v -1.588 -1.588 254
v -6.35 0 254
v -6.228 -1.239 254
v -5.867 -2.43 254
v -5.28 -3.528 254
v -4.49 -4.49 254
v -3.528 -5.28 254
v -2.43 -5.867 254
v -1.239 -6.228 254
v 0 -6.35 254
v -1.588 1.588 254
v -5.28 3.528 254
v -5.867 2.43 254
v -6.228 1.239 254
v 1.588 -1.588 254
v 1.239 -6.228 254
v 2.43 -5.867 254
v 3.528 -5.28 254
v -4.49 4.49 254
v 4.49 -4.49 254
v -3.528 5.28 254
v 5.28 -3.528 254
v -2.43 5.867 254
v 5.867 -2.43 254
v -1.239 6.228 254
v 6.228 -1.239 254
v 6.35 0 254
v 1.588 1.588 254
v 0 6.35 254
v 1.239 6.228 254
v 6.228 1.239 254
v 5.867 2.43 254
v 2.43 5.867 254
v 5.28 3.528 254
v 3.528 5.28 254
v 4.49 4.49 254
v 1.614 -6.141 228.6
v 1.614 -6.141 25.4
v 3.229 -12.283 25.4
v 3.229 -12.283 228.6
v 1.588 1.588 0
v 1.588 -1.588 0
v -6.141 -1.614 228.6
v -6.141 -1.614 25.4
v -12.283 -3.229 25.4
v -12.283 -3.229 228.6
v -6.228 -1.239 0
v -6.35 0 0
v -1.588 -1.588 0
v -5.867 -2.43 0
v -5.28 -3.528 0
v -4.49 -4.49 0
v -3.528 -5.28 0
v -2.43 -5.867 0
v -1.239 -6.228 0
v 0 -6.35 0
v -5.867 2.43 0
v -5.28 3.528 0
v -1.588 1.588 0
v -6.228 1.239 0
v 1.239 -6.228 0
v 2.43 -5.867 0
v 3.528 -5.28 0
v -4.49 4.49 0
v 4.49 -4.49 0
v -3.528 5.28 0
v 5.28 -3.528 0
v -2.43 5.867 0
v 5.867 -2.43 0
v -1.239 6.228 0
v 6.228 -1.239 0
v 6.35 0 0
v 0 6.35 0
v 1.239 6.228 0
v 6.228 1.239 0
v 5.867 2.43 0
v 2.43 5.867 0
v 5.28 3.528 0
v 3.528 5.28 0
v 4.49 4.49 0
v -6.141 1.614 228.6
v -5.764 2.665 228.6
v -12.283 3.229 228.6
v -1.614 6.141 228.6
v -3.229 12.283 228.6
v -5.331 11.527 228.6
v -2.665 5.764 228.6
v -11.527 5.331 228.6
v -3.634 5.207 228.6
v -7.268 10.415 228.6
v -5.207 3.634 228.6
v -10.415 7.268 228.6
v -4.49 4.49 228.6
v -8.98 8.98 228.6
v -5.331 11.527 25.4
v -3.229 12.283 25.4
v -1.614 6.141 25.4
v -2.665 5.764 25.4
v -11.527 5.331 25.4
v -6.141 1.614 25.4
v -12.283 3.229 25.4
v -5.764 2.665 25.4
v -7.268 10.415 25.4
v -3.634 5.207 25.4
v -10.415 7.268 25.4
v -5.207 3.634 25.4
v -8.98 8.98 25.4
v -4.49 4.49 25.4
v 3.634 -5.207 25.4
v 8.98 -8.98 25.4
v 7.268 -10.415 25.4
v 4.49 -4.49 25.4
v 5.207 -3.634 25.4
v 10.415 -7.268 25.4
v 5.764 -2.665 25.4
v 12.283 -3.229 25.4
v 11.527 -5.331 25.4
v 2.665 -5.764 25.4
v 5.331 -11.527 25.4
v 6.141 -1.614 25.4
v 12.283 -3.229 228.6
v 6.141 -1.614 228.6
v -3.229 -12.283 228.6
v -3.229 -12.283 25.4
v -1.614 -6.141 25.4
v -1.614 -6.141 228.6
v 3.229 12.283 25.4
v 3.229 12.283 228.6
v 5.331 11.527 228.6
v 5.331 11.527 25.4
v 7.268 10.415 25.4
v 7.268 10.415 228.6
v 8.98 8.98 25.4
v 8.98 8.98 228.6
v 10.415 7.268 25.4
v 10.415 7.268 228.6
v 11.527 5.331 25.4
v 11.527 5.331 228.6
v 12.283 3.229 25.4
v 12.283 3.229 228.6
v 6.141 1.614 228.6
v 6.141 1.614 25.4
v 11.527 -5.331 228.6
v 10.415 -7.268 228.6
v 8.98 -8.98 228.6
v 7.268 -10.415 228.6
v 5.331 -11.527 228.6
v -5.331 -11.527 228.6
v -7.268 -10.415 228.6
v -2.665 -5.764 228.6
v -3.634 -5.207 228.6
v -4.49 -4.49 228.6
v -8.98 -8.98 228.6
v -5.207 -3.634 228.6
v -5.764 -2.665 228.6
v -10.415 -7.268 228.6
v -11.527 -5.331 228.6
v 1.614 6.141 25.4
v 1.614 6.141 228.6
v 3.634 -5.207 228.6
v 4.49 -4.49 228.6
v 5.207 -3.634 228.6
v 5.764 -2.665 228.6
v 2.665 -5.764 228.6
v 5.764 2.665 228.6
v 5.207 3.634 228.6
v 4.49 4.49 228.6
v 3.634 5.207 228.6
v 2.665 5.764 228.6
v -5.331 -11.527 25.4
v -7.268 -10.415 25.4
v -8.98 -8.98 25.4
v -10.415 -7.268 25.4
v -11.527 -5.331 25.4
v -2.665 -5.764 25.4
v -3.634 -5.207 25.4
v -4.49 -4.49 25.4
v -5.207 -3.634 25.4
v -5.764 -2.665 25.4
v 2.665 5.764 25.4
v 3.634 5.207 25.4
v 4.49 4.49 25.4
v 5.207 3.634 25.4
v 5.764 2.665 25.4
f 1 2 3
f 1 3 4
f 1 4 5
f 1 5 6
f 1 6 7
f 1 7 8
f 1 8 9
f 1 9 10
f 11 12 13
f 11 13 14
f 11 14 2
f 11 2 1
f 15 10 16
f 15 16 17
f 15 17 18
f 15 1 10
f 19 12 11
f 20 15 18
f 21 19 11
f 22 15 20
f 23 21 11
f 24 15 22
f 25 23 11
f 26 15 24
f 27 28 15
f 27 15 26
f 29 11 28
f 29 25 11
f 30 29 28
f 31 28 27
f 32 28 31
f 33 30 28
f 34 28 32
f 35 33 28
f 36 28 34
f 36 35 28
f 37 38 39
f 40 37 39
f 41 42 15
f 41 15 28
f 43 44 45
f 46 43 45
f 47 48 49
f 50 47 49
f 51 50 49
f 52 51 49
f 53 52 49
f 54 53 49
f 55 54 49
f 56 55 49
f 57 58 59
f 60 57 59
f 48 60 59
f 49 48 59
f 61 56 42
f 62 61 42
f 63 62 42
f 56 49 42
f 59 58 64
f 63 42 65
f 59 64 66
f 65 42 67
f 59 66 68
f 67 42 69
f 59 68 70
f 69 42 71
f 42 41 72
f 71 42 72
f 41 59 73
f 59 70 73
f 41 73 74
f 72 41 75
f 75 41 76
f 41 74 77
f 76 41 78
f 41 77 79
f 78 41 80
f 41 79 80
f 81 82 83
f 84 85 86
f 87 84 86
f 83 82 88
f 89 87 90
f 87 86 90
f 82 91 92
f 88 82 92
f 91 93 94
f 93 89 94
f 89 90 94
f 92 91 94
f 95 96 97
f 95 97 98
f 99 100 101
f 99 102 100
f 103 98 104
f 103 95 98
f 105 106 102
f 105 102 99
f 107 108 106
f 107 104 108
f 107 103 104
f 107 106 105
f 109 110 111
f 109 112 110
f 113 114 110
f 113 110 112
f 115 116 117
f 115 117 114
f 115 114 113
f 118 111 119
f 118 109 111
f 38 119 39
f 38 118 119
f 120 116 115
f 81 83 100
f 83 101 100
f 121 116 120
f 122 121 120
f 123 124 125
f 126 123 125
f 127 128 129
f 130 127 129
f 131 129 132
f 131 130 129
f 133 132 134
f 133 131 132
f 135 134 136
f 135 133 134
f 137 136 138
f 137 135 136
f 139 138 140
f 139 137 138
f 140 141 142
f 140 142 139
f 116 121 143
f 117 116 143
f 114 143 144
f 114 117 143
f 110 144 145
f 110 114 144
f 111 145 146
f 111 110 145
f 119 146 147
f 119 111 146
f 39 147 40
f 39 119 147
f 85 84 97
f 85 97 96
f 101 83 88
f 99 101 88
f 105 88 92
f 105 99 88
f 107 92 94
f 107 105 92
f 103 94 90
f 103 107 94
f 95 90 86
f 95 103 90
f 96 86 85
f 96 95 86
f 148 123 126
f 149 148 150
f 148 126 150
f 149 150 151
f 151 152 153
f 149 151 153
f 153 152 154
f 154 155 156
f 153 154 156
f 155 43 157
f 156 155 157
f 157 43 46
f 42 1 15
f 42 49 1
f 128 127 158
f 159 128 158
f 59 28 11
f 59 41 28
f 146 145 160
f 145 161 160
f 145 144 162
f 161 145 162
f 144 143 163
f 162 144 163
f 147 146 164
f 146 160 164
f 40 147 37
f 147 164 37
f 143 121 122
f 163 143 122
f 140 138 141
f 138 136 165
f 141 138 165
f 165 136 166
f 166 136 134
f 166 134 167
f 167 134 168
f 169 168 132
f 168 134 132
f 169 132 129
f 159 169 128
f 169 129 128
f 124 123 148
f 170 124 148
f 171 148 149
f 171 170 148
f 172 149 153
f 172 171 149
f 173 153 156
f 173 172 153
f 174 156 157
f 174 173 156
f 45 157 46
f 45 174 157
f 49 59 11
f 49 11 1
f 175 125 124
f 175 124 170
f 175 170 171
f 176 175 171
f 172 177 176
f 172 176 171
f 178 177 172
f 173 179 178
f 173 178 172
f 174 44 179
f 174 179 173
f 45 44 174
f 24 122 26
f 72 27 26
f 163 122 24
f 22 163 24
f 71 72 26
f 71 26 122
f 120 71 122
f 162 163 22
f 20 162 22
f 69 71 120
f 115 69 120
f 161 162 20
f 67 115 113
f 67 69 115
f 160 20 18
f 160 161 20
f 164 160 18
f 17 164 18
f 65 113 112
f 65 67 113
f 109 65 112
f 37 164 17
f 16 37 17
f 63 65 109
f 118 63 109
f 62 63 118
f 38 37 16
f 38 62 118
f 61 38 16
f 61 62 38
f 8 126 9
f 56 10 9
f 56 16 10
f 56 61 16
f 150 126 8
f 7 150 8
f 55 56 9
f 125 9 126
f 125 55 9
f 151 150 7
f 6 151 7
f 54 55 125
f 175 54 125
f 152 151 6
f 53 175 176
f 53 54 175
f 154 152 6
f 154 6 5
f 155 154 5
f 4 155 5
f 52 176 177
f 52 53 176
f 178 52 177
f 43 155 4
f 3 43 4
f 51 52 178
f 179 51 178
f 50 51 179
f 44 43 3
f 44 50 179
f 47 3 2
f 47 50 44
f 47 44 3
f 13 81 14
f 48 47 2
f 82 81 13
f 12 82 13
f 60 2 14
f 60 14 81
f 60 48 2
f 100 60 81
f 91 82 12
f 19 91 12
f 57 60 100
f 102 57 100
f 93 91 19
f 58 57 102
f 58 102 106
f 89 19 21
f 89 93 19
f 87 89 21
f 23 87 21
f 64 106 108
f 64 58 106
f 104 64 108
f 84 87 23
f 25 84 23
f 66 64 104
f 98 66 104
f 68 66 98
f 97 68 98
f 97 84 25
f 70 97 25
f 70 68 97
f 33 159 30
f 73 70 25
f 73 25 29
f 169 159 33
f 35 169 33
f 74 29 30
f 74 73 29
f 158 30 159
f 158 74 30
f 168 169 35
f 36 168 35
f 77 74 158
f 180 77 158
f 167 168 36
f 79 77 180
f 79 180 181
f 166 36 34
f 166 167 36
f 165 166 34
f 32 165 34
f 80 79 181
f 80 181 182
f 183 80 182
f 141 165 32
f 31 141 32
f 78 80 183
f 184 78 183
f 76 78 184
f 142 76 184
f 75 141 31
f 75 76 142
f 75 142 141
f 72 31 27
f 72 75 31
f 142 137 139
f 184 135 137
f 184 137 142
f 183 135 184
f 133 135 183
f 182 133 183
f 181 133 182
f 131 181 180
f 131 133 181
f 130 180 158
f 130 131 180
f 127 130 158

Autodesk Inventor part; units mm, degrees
ref_plane "YZ Plane" through (0, 0, 0) normal (1, 0, 0) x (0, 1, 0)
ref_plane "XZ Plane" through (0, 0, 0) normal (0, 1, 0) x (-1, 0, 0)
ref_plane "XY Plane" through (0, 0, 0) normal (0, 0, 1) x (1, 0, 0)
sketch "Sketch1" plane through (0, 0, 0) normal (0, 0, 1) x (1, 0, 0)
  circle A0 centre (0, 0) radius 6.35
  line L0 (-1.5875, -1.5875) -> (1.5875, -1.5875)
  line L1 (1.5875, -1.5875) -> (1.5875, 1.5875)
  line L2 (1.5875, 1.5875) -> (-1.5875, 1.5875)
  line L3 (-1.5875, 1.5875) -> (-1.5875, -1.5875)
  line L4 (-1.5875, -1.5875) -> (1.5875, 1.5875) construction
  line L5 (1.5875, -1.5875) -> (-1.5875, 1.5875) construction
  dimension "d0" = 12.7
  dimension "d3" = 3.175
  dimension "d4" = 3.175
extrude "Extrusion1" add sketch "Sketch1" along normal blind 254 contours A0 | L3 L2 L1 L0
extrude "Extrusion2" cut sketch "Sketch1" along normal blind 254 contours L3 L2 L1 L0
ref_plane "Work Plane1" through (0, 0, 25.4) normal (0, 0, -1) x (-1, 0, 0)
sketch "Sketch2" plane through (0, 0, 25.4) normal (0, 0, -1) x (-1, 0, 0)
  circle A0 centre (0, 0) radius 10.16
  line L0 (0, 0) -> (-12.2827, 3.2288)
  circle A1 centre (0, 0) radius 6.35 projected
  line L1 (-12.2827, -3.2288) -> (0, 0)
  arc A2 (-3.2288, 12.2827) -> (-12.2827, 3.2288) centre (0, 0) ccw
  arc A3 (12.2827, 3.2288) -> (3.2288, 12.2827) centre (0, 0) ccw
  arc A4 (-12.2827, -3.2288) -> (-3.2288, -12.2827) centre (0, 0) ccw
  arc A5 (3.2288, -12.2827) -> (12.2827, -3.2288) centre (0, 0) ccw
  line L2 (0, 0) -> (-3.2288, -12.2827)
  line L3 (3.2288, -12.2827) -> (0, 0)
  line L4 (0, 0) -> (12.2827, -3.2288)
  line L5 (12.2827, 3.2288) -> (0, 0)
  line L6 (0, 0) -> (3.2288, 12.2827)
  line L7 (-3.2288, 12.2827) -> (0, 0)
  point P0 (-1.6144, -6.1414)
  point P1 (-6.1414, -1.6144)
  point P2 (6.1414, -1.6144)
  point P3 (1.6144, -6.1414)
  point P4 (1.6144, 6.1414)
  point P5 (6.1414, 1.6144)
  point P6 (-6.1414, 1.6144)
  point P7 (-1.6144, 6.1414)
  dimension "d11" = 20.32
  dimension "d20" = 360
extrude "Extrusion4" add sketch "Sketch2" against normal blind 203.2 contours L5 A1 L6 A0 | A0 L6 A3 L5 | L4 A5 L3 A0 | A0 L3 A1 L4 | L7 A1 L0 A0 | A0 L0 A2 L7 | L2 A4 L1 A0 | A0 L1 A1 L2
properties part number "Nicoles_Roomba_Blade_Axle"
